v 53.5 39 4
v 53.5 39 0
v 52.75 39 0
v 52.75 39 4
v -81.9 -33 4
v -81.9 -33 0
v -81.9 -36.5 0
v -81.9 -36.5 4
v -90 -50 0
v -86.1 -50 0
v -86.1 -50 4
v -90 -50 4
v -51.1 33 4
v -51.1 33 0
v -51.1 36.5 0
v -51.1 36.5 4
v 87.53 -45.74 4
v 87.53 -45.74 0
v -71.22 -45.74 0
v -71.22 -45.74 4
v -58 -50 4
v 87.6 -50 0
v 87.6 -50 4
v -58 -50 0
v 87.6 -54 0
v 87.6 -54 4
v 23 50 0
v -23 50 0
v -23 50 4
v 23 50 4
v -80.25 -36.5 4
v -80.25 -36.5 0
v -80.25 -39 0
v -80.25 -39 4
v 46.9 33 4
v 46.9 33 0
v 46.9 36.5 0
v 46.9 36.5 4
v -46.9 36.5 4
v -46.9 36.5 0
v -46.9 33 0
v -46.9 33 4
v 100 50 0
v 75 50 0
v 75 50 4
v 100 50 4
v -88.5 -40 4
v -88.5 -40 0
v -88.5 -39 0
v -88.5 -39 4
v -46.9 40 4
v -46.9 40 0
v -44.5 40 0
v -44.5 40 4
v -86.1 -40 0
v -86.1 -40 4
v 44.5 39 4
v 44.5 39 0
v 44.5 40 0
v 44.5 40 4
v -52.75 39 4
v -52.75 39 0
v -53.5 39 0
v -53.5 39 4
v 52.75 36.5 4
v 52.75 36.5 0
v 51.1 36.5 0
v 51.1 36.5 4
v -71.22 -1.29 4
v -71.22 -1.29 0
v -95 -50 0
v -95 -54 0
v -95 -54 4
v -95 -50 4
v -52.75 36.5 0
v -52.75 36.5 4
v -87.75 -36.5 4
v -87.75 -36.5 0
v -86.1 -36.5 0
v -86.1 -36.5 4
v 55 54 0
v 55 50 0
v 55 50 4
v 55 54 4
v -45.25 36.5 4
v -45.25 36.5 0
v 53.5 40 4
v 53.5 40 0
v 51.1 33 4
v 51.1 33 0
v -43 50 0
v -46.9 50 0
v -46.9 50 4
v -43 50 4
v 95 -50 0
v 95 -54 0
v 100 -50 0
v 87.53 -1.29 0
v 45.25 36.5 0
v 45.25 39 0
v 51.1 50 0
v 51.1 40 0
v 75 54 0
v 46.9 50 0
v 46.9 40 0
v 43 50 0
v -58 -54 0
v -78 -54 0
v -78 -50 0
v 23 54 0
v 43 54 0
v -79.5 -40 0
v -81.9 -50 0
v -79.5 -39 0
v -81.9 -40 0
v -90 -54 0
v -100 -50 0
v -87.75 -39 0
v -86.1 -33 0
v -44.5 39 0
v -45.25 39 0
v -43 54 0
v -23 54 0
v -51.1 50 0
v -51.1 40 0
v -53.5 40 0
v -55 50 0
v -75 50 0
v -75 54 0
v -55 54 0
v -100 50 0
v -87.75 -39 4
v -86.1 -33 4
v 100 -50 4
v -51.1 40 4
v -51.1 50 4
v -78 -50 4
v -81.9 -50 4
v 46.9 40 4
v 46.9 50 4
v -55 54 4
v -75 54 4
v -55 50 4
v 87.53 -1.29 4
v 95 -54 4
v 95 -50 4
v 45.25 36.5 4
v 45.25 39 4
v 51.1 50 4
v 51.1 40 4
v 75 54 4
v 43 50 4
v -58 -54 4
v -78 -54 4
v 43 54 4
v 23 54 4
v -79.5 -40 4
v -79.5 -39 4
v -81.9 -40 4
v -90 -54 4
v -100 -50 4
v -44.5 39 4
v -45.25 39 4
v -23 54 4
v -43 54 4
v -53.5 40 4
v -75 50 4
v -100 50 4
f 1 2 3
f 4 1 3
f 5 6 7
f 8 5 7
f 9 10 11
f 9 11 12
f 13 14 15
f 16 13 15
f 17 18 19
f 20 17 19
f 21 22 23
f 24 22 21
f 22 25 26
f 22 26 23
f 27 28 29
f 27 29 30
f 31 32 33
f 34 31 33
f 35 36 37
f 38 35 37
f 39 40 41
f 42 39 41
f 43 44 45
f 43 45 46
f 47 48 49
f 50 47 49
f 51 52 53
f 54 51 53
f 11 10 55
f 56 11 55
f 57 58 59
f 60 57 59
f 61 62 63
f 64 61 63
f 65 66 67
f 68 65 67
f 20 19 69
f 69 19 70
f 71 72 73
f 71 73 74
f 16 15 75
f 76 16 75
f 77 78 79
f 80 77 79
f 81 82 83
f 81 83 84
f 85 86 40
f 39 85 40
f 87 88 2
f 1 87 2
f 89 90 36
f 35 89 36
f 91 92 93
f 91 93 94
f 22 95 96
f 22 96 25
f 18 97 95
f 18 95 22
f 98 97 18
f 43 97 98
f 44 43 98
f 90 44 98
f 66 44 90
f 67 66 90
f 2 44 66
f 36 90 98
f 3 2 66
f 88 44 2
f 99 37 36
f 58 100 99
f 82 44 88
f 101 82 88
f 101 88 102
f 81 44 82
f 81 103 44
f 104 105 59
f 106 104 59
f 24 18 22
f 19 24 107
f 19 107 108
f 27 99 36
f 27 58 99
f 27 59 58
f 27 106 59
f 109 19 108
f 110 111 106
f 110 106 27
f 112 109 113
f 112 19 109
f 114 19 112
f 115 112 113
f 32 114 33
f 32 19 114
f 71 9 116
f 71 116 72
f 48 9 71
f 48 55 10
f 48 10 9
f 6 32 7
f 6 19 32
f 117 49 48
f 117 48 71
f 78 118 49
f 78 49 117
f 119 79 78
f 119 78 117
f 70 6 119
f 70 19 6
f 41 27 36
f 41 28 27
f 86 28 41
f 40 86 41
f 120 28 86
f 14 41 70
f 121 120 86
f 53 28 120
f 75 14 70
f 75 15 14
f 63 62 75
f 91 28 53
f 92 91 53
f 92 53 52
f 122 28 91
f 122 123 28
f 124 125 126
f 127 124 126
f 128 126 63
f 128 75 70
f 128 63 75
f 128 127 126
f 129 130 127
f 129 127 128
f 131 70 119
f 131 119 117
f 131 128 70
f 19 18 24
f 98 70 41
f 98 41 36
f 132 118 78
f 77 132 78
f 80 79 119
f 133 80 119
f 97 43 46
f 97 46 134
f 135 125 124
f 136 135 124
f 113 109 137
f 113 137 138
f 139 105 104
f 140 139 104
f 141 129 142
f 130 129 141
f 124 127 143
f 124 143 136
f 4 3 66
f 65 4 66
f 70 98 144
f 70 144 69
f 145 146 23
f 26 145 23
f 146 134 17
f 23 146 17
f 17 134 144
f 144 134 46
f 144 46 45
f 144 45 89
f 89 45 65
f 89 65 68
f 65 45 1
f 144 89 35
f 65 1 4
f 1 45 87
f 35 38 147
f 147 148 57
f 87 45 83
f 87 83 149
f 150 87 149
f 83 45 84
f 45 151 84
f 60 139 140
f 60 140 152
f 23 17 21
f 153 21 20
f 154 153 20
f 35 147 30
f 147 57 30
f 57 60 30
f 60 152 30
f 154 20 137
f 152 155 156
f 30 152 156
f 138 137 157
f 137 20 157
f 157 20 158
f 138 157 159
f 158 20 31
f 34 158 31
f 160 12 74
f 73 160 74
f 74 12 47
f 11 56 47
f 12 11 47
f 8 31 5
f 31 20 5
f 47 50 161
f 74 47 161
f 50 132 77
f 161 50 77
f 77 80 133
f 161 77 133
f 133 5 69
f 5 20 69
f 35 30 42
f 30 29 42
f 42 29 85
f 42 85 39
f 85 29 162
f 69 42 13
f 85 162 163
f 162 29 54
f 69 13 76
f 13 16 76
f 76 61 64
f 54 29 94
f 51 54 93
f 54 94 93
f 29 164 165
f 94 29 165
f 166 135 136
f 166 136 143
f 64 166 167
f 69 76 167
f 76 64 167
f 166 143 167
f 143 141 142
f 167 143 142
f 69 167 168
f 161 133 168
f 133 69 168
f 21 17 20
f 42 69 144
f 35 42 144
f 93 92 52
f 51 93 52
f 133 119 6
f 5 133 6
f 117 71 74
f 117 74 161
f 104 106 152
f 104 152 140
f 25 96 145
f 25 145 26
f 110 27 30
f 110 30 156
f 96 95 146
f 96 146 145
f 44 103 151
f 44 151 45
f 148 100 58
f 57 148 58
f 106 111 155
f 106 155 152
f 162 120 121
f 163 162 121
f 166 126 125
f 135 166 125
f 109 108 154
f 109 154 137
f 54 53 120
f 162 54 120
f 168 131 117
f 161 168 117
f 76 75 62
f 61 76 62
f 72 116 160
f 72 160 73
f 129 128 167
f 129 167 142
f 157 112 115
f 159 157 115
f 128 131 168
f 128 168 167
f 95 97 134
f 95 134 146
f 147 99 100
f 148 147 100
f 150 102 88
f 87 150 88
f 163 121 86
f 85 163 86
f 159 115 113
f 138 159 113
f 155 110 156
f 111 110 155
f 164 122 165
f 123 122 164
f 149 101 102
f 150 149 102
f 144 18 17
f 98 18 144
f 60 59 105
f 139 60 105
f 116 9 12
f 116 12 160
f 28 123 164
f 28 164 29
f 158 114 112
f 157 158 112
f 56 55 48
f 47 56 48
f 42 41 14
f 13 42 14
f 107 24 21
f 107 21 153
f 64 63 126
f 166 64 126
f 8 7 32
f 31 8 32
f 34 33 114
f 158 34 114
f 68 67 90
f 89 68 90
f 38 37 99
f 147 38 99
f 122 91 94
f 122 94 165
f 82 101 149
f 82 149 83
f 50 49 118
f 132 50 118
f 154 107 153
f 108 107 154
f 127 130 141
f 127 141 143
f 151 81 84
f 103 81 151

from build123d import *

# Parameters (mm, degrees)
BOSS_EXTRUDE1_DEPTH = 4
SKETCH2_W           = 158.75
SKETCH2_H           = 44.45
CUT_EXTRUDE1_DEPTH  = 6
CUT_EXTRUDE2_DEPTH  = 10
SKETCH4_W           = 5
SKETCH4_H           = 4
CUT_EXTRUDE3_DEPTH  = 10


with BuildPart() as part:
    # Sketch1 → Boss-Extrude1 (new body)
    with BuildSketch(Plane.XY):
        Polygon((-55, 50), (-43, 50), (-43, 54), (-23, 54), (-23, 50), (23, 50), (23, 54), (43, 54), (43, 50), (55, 50), (55, 54), (75, 54), (75, 50), (100, 50), (100, -50), (95, -50), (95, -54), (87.6, -54), (87.6, -50), (-58, -50), (-58, -54), (-78, -54), (-78, -50), (-90, -50), (-90, -54), (-100, -54), (-100, -50), (-100, 50), (-75, 50), (-75, 54), (-55, 54), align=None)
    extrude(amount=BOSS_EXTRUDE1_DEPTH)

    # Sketch2 → Cut-Extrude1 (cut)
    with BuildSketch(Plane(origin=(0, 0, 0), x_dir=(-1, 0, 0), z_dir=(0, 0, -1))):
        with Locations((-8.155, -23.515)):
            Rectangle(SKETCH2_W, SKETCH2_H)
    extrude(amount=-CUT_EXTRUDE1_DEPTH, mode=Mode.SUBTRACT)

    # Sketch3 → Cut-Extrude2 (cut)
    with BuildSketch(Plane(origin=(0, 0, 0), x_dir=(-1, 0, 0), z_dir=(0, 0, -1))):
        Polygon((-46.9, 50), (-51.1, 50), (-51.1, 40), (-53.5, 40), (-53.5, 39), (-52.75, 39), (-52.75, 36.5), (-51.1, 36.5), (-51.1, 33), (-46.9, 33), (-46.9, 36.5), (-45.25, 36.5), (-45.25, 39), (-44.5, 39), (-44.5, 40), (-46.9, 40), align=None)
        Polygon((51.1, 40), (51.1, 50), (46.9, 50), (46.9, 40), (44.5, 40), (44.5, 39), (45.25, 39), (45.25, 36.5), (46.9, 36.5), (46.9, 33), (51.1, 33), (51.1, 36.5), (52.75, 36.5), (52.75, 39), (53.5, 39), (53.5, 40), align=None)
        Polygon((81.9, -40), (81.9, -50), (86.1, -50), (86.1, -40), (88.5, -40), (88.5, -39), (87.75, -39), (87.75, -36.5), (86.1, -36.5), (86.1, -33), (81.9, -33), (81.9, -36.5), (80.25, -36.5), (80.25, -39), (79.5, -39), (79.5, -40), align=None)
    extrude(amount=-CUT_EXTRUDE2_DEPTH, mode=Mode.SUBTRACT)

    # Sketch4 → Cut-Extrude3 (cut)
    with BuildSketch(Plane(origin=(0, 0, 0), x_dir=(-1, 0, 0), z_dir=(0, 0, -1))):
        with Locations((97.5, -52)):
            Rectangle(SKETCH4_W, SKETCH4_H)
    extrude(amount=-CUT_EXTRUDE3_DEPTH, mode=Mode.SUBTRACT)


solid = part.part
